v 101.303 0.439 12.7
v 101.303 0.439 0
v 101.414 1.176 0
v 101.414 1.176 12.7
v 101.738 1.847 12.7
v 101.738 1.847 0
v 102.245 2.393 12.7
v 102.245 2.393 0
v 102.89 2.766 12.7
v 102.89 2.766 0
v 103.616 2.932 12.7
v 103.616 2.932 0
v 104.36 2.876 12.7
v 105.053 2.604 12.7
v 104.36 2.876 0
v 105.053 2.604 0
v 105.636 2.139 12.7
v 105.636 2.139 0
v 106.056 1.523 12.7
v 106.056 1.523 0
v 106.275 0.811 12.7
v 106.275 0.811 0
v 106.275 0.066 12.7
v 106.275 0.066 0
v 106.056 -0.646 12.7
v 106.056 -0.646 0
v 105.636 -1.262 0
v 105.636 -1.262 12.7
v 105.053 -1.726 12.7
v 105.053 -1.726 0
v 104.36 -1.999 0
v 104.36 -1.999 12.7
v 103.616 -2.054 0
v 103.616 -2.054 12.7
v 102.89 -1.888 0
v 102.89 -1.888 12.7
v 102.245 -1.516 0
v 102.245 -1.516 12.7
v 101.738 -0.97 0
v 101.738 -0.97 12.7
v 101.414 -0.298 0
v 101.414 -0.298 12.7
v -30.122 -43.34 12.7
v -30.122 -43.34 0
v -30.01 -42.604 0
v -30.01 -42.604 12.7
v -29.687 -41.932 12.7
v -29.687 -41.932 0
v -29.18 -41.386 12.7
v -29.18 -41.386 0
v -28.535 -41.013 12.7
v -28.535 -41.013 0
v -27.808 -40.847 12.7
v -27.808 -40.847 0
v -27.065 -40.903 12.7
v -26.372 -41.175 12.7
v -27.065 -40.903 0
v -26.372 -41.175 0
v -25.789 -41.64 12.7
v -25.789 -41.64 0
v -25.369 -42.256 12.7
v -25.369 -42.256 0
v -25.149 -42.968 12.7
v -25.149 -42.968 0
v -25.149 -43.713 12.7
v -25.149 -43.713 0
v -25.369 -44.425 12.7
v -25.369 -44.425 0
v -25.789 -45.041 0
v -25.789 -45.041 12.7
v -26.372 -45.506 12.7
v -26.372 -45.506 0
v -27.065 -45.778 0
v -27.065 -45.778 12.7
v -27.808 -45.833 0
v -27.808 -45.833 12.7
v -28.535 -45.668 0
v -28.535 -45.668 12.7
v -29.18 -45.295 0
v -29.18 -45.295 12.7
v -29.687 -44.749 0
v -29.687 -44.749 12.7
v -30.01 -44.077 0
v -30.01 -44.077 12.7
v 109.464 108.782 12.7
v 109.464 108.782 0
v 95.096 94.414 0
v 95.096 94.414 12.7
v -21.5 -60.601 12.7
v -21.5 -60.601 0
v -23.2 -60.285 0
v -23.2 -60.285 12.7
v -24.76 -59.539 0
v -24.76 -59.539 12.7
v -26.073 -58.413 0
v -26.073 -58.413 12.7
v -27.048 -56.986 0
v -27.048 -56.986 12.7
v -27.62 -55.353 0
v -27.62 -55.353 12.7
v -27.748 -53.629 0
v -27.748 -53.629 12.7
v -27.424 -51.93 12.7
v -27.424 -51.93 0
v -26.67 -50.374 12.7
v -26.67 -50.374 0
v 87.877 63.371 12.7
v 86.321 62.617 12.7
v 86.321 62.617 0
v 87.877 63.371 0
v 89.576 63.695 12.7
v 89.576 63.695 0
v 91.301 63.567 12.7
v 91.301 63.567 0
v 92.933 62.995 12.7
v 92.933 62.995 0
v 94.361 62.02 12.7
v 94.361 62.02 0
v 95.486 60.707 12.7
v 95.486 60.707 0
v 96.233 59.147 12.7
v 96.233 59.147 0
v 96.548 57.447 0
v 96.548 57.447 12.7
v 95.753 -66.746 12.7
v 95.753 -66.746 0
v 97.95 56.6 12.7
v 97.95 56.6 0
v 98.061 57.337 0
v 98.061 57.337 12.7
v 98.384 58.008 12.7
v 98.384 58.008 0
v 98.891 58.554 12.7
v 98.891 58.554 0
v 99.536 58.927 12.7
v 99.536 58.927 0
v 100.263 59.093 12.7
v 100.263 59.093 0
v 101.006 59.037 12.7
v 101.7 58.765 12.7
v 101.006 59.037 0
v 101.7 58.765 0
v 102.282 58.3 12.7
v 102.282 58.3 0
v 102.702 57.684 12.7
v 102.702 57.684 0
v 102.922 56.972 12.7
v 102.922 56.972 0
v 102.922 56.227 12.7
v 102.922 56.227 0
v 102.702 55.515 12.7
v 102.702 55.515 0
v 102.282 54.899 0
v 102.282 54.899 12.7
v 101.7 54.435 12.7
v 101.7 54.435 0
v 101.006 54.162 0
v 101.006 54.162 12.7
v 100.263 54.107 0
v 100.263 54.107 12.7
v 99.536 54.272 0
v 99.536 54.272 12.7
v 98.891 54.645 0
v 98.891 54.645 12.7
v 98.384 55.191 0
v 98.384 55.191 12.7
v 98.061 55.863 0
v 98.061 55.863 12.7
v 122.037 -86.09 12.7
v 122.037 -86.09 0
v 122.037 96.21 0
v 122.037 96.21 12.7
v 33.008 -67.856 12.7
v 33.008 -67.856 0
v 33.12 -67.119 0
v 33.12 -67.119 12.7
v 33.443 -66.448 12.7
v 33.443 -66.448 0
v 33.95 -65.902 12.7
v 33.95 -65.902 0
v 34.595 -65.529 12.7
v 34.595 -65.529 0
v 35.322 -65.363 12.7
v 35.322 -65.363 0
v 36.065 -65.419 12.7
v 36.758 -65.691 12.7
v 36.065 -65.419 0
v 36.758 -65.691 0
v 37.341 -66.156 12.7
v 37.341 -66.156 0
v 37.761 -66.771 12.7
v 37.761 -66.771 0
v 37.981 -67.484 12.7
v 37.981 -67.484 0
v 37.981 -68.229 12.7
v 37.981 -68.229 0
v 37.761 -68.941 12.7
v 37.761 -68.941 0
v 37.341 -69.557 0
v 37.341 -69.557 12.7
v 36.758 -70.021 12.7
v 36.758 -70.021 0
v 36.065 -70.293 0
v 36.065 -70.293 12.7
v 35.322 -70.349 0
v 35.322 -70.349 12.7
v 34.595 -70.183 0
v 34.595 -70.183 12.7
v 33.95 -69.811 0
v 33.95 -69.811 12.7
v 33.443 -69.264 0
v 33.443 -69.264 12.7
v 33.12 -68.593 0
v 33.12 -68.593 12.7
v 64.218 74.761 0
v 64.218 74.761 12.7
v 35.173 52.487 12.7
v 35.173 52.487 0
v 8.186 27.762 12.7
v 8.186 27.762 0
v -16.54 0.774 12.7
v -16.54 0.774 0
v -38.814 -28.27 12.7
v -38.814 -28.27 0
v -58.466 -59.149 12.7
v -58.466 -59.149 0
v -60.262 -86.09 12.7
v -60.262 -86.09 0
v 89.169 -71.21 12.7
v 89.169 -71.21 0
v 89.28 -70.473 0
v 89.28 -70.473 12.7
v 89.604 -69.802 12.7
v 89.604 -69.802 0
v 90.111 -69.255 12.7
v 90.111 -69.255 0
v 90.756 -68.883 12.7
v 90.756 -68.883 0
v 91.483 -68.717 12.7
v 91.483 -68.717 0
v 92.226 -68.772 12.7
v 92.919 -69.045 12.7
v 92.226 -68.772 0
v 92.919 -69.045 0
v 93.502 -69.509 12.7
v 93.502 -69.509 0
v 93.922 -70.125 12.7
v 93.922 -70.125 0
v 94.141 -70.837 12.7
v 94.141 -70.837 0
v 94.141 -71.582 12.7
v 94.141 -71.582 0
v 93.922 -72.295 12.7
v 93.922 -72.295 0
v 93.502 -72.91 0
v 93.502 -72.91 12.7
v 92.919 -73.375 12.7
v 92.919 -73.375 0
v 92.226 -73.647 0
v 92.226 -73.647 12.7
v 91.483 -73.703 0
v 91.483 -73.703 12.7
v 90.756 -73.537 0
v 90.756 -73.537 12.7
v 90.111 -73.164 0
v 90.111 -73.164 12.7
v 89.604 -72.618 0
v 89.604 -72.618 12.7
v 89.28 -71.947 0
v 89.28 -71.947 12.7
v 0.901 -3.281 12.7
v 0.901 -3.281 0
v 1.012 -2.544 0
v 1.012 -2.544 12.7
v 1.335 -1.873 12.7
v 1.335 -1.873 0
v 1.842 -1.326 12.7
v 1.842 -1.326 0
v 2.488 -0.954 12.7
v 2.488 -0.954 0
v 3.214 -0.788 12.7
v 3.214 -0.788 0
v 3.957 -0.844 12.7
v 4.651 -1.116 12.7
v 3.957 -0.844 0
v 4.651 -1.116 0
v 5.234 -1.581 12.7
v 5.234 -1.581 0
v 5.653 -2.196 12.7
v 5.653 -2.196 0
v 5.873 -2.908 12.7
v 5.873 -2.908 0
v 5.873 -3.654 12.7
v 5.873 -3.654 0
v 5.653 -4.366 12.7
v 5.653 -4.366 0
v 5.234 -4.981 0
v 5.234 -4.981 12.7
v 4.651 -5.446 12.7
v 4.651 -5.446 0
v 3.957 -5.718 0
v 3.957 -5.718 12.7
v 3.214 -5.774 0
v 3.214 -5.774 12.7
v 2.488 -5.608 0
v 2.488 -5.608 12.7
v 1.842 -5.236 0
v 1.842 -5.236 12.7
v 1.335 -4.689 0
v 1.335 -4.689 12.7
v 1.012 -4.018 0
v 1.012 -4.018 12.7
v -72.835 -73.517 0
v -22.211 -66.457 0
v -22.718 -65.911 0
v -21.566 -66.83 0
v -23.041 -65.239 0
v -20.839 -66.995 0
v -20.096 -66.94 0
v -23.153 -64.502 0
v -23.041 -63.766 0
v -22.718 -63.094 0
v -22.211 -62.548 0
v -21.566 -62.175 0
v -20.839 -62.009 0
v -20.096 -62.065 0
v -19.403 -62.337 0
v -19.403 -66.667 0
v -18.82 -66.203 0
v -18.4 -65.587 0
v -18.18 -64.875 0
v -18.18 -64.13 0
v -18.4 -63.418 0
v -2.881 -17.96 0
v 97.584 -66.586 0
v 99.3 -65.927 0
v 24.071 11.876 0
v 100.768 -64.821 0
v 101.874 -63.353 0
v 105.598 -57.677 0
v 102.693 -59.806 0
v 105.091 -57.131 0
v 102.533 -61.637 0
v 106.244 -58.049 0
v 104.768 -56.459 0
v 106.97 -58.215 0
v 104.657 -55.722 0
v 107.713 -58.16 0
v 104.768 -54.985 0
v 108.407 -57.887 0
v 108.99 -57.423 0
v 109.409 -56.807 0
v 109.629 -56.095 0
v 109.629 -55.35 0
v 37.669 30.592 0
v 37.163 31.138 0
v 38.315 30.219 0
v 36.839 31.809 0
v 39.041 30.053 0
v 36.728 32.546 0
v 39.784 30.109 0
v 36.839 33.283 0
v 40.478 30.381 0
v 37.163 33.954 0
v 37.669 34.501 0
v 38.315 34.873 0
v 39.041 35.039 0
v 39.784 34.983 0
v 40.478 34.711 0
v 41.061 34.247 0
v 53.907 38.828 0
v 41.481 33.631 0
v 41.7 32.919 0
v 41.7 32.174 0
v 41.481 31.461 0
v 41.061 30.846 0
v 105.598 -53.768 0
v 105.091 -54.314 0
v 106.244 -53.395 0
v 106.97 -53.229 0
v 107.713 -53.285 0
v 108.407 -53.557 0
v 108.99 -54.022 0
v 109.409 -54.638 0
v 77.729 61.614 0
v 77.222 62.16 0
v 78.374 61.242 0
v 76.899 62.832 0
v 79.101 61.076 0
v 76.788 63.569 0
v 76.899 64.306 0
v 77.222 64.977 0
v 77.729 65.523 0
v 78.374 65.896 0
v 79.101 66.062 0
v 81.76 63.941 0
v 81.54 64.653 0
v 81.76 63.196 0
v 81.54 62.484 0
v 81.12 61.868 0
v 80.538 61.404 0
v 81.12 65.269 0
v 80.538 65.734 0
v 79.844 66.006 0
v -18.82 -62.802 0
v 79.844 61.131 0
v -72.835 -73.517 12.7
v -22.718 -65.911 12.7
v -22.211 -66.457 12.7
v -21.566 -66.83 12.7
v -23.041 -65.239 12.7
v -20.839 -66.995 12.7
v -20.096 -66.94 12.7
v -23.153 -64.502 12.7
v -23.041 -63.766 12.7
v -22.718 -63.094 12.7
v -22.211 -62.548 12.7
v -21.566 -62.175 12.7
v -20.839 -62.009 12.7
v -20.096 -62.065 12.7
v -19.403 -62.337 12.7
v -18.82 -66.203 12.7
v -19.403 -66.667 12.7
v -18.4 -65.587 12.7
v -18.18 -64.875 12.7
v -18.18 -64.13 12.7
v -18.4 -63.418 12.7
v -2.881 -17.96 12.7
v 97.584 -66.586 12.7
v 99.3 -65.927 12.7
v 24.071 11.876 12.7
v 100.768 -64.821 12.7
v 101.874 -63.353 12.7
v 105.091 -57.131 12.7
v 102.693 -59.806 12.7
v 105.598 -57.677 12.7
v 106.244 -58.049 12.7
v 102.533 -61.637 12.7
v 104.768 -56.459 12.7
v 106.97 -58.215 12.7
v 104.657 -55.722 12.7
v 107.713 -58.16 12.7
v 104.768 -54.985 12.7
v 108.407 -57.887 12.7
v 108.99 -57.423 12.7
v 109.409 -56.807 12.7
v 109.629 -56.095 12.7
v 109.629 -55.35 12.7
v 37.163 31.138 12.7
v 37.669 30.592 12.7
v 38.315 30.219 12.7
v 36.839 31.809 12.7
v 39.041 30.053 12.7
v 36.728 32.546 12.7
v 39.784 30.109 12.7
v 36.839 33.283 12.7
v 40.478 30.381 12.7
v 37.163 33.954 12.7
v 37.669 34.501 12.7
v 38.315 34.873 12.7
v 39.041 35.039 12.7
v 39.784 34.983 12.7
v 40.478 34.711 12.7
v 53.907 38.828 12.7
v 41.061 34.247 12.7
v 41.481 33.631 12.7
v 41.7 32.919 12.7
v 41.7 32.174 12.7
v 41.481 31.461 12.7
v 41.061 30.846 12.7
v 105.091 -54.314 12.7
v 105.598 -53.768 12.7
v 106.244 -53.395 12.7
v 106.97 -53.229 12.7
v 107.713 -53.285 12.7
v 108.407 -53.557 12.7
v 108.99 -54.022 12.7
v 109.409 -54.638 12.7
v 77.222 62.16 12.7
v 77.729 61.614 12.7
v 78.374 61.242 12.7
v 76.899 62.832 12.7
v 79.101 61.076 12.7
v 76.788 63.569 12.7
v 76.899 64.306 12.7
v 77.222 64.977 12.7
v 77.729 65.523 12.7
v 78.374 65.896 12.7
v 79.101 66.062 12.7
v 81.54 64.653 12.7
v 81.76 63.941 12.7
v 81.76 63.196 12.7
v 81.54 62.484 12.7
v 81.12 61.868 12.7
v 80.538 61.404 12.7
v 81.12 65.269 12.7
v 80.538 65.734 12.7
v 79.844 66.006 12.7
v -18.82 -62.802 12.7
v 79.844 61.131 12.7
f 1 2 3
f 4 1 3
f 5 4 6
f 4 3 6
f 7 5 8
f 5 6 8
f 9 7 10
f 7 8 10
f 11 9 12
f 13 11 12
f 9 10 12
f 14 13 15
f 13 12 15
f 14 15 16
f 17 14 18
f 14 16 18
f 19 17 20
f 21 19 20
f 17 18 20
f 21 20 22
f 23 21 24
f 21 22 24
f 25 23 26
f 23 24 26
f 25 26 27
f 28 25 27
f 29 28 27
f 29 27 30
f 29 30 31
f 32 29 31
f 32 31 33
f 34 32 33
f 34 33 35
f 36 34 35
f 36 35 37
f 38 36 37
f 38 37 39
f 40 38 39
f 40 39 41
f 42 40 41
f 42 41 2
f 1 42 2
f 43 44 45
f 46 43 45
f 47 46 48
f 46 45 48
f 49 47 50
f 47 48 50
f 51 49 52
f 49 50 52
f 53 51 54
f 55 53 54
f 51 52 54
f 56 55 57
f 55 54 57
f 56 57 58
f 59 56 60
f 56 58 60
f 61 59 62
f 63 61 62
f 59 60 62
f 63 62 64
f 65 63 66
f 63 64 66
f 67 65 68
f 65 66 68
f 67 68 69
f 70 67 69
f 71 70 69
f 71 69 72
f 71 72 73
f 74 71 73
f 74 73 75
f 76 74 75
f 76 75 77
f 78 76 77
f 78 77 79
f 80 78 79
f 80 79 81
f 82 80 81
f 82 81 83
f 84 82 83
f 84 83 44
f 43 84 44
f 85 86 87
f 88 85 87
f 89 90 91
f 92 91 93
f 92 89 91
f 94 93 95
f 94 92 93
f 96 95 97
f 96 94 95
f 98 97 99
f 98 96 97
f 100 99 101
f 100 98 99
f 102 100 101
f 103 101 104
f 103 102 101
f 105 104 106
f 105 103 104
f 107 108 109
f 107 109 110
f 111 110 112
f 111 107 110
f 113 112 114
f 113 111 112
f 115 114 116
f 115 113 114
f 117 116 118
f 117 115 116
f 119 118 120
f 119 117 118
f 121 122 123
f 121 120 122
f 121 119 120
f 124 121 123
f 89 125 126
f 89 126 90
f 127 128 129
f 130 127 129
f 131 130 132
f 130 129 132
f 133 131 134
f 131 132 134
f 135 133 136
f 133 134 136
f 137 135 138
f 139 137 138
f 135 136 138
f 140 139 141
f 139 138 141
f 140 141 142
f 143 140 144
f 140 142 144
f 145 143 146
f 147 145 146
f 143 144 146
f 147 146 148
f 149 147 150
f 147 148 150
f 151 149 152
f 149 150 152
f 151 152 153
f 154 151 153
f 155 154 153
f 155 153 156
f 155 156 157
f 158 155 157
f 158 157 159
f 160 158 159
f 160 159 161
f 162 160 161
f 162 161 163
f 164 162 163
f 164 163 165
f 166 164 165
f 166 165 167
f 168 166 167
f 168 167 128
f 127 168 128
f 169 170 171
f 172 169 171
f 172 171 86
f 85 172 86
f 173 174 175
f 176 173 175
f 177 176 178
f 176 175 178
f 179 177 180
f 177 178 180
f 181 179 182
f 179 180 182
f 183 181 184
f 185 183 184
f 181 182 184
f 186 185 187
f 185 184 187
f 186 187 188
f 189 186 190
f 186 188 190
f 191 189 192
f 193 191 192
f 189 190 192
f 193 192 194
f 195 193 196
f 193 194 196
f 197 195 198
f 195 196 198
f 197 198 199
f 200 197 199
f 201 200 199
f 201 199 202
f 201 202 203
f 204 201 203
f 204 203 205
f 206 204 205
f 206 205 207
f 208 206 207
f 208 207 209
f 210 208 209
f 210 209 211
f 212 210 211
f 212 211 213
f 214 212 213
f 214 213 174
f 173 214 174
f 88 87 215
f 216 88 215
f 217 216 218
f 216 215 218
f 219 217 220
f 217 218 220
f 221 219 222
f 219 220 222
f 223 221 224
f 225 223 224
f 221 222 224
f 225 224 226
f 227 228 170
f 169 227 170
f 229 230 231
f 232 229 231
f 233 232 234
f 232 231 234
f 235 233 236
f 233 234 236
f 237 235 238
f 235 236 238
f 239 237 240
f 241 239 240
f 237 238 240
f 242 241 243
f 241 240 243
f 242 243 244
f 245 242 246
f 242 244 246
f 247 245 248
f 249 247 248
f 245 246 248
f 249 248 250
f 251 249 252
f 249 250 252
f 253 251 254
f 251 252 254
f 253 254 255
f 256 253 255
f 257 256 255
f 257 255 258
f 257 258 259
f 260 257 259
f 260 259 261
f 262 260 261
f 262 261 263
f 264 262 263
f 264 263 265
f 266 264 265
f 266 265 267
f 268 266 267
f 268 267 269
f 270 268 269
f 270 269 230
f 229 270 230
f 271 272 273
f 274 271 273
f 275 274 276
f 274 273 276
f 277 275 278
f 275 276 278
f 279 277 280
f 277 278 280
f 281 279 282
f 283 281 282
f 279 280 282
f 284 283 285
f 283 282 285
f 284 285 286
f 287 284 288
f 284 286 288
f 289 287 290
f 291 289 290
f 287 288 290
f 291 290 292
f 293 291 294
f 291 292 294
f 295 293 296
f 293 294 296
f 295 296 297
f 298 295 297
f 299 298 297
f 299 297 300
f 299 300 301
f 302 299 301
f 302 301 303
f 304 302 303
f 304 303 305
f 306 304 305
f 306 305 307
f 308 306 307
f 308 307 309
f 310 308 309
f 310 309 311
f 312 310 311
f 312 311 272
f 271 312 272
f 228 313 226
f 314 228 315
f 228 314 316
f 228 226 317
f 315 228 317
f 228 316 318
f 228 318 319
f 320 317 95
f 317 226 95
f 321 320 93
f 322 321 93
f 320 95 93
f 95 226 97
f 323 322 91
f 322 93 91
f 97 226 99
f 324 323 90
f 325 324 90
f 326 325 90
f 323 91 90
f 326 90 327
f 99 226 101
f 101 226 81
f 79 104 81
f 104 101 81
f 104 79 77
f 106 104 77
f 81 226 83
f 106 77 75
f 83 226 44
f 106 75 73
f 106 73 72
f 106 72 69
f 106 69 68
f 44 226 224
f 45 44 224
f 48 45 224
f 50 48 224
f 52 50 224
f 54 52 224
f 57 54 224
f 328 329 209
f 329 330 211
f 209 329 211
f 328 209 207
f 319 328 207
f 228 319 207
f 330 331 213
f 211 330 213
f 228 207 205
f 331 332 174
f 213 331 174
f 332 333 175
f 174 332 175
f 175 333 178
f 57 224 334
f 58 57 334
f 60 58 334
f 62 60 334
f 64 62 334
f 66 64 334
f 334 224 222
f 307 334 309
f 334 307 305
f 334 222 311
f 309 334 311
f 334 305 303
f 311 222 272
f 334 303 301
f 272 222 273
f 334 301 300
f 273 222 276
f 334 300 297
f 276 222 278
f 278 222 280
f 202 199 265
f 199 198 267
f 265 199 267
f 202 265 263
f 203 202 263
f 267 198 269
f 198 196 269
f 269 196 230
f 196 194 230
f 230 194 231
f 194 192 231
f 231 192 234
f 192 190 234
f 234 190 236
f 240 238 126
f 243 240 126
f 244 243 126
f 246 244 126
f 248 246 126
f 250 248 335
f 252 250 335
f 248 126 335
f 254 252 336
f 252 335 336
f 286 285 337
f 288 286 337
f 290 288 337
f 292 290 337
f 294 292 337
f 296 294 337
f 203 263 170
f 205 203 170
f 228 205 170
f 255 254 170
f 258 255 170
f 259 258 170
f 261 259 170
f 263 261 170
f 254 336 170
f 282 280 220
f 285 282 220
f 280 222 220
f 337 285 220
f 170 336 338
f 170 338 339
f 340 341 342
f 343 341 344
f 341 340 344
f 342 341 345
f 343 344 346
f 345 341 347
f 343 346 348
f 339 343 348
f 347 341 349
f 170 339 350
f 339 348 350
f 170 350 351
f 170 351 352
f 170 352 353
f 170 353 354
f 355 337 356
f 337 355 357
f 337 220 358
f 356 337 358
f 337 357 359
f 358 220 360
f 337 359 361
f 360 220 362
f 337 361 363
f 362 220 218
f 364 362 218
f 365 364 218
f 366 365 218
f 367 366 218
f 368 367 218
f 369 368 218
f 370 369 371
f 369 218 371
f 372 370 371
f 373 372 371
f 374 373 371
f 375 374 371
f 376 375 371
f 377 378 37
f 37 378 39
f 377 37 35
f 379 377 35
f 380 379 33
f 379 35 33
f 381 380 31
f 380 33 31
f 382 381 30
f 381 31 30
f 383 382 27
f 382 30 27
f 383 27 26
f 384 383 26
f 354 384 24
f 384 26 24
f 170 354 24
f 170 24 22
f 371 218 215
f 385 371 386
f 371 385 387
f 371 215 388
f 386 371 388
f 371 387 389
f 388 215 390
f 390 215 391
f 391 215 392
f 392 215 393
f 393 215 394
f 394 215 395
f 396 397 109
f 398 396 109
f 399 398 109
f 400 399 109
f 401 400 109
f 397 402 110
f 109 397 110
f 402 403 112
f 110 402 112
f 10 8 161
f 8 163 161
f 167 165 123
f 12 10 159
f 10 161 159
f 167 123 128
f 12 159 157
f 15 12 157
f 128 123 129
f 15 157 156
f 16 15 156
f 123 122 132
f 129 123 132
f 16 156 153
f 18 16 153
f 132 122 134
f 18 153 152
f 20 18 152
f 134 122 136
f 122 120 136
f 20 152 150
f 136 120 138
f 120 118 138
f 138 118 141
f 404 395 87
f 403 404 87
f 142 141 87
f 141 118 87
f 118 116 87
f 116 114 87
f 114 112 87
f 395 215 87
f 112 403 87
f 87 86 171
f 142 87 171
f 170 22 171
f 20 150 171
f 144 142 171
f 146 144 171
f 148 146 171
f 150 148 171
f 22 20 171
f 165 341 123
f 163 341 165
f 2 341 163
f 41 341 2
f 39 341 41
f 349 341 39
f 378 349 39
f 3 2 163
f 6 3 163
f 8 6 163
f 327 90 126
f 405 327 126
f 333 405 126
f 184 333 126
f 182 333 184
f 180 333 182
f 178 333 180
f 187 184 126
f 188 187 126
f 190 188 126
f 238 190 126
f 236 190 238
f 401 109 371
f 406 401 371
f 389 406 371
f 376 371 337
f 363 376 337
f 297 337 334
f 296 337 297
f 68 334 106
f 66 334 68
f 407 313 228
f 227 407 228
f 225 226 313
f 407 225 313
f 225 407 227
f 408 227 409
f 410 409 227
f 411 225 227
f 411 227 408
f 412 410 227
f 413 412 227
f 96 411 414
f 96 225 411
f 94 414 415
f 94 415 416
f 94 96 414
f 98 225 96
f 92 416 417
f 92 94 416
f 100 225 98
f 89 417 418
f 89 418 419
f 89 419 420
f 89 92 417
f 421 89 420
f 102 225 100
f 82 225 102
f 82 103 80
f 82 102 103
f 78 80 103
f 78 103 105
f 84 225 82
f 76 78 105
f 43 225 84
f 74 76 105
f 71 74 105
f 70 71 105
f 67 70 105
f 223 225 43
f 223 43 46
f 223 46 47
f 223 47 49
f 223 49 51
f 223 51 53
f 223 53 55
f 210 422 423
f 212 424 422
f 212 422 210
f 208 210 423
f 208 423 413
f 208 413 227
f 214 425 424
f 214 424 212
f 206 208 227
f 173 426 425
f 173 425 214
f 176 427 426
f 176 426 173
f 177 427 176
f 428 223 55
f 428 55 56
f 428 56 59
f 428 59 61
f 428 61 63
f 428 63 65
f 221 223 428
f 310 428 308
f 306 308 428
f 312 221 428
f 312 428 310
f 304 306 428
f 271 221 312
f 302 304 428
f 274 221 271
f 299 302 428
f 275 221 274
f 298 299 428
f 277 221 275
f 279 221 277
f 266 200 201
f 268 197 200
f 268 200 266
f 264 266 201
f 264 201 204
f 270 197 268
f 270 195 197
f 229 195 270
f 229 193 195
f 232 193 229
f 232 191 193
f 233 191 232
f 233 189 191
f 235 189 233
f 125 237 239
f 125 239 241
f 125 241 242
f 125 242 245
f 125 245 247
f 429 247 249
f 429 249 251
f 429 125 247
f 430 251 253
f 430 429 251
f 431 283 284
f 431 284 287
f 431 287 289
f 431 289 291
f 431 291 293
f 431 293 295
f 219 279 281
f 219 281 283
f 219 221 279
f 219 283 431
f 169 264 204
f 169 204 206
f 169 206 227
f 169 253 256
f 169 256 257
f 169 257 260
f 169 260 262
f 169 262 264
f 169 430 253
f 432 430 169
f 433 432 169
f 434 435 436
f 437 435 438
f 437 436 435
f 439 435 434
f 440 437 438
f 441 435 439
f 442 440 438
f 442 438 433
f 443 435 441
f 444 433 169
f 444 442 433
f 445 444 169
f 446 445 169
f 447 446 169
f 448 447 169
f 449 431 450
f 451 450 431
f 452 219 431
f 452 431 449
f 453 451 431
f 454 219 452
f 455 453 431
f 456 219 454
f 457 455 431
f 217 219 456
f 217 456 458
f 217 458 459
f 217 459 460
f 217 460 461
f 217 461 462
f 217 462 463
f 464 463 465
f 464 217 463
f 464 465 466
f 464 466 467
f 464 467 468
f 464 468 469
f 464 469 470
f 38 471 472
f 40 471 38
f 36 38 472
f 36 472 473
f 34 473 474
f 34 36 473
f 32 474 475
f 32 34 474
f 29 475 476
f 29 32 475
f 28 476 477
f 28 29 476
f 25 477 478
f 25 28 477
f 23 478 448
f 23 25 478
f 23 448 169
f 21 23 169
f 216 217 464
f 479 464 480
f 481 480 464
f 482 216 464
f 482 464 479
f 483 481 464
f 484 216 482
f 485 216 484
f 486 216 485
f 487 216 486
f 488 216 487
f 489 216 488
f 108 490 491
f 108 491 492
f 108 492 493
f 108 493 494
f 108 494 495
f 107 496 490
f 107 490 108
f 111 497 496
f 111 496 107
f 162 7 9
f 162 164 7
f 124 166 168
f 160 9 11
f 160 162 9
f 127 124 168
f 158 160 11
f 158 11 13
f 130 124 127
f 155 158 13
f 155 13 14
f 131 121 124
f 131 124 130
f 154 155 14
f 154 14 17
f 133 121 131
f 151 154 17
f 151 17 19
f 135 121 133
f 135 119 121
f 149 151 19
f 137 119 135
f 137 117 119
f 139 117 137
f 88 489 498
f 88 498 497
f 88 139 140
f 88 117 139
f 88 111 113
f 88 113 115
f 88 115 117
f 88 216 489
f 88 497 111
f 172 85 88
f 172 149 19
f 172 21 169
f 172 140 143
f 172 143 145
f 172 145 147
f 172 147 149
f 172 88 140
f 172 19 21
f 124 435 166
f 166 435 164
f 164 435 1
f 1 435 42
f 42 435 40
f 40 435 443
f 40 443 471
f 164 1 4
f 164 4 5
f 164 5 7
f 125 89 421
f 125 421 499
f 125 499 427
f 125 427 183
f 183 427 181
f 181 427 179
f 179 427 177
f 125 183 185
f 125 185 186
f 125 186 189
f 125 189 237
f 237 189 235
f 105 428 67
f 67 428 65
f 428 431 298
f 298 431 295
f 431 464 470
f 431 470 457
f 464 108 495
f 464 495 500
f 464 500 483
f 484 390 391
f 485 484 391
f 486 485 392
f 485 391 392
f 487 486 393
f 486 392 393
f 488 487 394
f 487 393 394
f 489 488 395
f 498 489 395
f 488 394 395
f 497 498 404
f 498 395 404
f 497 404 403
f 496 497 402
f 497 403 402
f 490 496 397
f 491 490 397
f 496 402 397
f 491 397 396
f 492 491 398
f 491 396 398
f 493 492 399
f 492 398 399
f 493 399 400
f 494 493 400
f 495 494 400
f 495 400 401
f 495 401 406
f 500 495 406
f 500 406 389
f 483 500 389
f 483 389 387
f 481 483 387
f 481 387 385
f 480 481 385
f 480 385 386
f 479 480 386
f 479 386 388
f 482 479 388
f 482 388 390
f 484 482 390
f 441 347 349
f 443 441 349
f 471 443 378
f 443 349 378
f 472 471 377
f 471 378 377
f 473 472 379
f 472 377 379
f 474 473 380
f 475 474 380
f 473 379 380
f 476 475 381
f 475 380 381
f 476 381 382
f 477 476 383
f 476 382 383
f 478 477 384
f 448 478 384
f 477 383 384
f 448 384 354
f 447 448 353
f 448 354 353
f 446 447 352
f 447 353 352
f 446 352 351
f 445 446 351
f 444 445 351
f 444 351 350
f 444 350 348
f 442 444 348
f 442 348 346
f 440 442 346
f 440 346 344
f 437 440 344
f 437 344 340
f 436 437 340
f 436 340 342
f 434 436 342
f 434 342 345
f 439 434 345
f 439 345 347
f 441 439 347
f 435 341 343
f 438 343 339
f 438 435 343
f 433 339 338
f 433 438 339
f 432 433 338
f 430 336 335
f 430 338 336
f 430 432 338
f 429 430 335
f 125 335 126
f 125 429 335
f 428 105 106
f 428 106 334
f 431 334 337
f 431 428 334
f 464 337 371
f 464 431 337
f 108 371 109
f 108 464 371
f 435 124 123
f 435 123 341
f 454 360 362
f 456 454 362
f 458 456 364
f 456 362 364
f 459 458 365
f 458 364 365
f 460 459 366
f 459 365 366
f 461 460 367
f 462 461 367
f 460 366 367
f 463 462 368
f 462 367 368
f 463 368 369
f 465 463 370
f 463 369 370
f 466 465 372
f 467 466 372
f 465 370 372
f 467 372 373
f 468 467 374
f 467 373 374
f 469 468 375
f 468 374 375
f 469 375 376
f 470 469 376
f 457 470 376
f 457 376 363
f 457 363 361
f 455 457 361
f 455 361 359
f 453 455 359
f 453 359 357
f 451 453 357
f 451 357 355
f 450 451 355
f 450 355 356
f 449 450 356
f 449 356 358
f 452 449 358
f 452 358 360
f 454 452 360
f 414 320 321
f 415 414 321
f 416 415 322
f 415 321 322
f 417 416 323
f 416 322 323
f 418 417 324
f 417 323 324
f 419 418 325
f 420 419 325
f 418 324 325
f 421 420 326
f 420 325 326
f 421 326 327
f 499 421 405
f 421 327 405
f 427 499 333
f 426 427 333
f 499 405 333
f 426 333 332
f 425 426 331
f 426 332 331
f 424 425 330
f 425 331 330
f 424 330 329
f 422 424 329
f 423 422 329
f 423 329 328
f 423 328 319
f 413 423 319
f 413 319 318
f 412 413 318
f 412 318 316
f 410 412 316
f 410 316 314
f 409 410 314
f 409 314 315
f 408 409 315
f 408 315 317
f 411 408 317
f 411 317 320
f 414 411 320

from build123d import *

# Parameters (mm, degrees)
BOSS_EXTRUDE1_DEPTH = 12.7
CUT_EXTRUDE1_DEPTH  = 164.974925036
SKETCH3_R           = 2.5
CUT_EXTRUDE2_DEPTH  = 164.974925036


with BuildPart() as part:
    # Sketch1 → Boss-Extrude1 (new body)
    with BuildSketch(Plane.XY):
        with BuildLine():
            Line((-60.262418021, -86.089619685), (122.036781237, -86.089619685))
            Line((122.036781237, -86.089619685), (122.036781237, 96.209579573))
            Line((122.036781237, 96.209579573), (109.464422667, 108.781938142))
            Line((109.464422667, 108.781938142), (95.096012874, 94.413528349))
            ThreePointArc((95.096012874, 94.413528349), (8.18551326, 27.761648291), (-58.466366797, -59.148851322))
            Line((-58.466366797, -59.148851322), (-72.83477659, -73.517261115))
            Line((-72.83477659, -73.517261115), (-60.262418021, -86.089619685))
        make_face()
    extrude(amount=BOSS_EXTRUDE1_DEPTH)

    # Sketch2 → Cut-Extrude1 (cut, through all)
    with BuildSketch(Plane.XY.offset(12.7)):
        with BuildLine():
            Line((96.548355206, 57.447236553), (102.693314786, -59.805577132))
            ThreePointArc((102.693314786, -59.805577132), (100.768098522, -64.82093697), (95.752738684, -66.746153234))
            Line((95.752738684, -66.746153234), (-21.500075001, -60.601193655))
            ThreePointArc((-21.500075001, -60.601193655), (-27.048234767, -56.985522244), (-26.669858487, -50.374018034))
            ThreePointArc((-26.669858487, -50.374018034), (24.070759008, 11.876402544), (86.321179585, 62.617020039))
            ThreePointArc((86.321179585, 62.617020039), (92.932683796, 62.995396319), (96.548355206, 57.447236553))
        make_face()
    extrude(amount=-CUT_EXTRUDE1_DEPTH, mode=Mode.SUBTRACT)

    # Sketch3 → Cut-Extrude2 (cut, through all)
    with BuildSketch(Plane(origin=(0, 0, 0), x_dir=(-1, 0, 0), z_dir=(0, 0, -1))):
        with Locations((-100.449569709, 56.599670194)):
            Circle(SKETCH3_R)
        with Locations((-79.287603593, 63.568690871)):
            Circle(SKETCH3_R)
        with Locations((-39.228116315, 32.54613876)):
            Circle(SKETCH3_R)
        with Locations((-3.401022792, -3.280954763)):
            Circle(SKETCH3_R)
        with Locations((27.621529319, -43.340442042)):
            Circle(SKETCH3_R)
        with Locations((20.652508642, -64.502408157)):
            Circle(SKETCH3_R)
        with Locations((-35.508445898, -67.856108518)):
            Circle(SKETCH3_R)
        with Locations((-91.669400439, -71.209808879)):
            Circle(SKETCH3_R)
        with Locations((-107.156970431, -55.722238887)):
            Circle(SKETCH3_R)
        with Locations((-103.80327007, 0.438715653)):
            Circle(SKETCH3_R)
    extrude(amount=-CUT_EXTRUDE2_DEPTH, mode=Mode.SUBTRACT)


solid = part.part
